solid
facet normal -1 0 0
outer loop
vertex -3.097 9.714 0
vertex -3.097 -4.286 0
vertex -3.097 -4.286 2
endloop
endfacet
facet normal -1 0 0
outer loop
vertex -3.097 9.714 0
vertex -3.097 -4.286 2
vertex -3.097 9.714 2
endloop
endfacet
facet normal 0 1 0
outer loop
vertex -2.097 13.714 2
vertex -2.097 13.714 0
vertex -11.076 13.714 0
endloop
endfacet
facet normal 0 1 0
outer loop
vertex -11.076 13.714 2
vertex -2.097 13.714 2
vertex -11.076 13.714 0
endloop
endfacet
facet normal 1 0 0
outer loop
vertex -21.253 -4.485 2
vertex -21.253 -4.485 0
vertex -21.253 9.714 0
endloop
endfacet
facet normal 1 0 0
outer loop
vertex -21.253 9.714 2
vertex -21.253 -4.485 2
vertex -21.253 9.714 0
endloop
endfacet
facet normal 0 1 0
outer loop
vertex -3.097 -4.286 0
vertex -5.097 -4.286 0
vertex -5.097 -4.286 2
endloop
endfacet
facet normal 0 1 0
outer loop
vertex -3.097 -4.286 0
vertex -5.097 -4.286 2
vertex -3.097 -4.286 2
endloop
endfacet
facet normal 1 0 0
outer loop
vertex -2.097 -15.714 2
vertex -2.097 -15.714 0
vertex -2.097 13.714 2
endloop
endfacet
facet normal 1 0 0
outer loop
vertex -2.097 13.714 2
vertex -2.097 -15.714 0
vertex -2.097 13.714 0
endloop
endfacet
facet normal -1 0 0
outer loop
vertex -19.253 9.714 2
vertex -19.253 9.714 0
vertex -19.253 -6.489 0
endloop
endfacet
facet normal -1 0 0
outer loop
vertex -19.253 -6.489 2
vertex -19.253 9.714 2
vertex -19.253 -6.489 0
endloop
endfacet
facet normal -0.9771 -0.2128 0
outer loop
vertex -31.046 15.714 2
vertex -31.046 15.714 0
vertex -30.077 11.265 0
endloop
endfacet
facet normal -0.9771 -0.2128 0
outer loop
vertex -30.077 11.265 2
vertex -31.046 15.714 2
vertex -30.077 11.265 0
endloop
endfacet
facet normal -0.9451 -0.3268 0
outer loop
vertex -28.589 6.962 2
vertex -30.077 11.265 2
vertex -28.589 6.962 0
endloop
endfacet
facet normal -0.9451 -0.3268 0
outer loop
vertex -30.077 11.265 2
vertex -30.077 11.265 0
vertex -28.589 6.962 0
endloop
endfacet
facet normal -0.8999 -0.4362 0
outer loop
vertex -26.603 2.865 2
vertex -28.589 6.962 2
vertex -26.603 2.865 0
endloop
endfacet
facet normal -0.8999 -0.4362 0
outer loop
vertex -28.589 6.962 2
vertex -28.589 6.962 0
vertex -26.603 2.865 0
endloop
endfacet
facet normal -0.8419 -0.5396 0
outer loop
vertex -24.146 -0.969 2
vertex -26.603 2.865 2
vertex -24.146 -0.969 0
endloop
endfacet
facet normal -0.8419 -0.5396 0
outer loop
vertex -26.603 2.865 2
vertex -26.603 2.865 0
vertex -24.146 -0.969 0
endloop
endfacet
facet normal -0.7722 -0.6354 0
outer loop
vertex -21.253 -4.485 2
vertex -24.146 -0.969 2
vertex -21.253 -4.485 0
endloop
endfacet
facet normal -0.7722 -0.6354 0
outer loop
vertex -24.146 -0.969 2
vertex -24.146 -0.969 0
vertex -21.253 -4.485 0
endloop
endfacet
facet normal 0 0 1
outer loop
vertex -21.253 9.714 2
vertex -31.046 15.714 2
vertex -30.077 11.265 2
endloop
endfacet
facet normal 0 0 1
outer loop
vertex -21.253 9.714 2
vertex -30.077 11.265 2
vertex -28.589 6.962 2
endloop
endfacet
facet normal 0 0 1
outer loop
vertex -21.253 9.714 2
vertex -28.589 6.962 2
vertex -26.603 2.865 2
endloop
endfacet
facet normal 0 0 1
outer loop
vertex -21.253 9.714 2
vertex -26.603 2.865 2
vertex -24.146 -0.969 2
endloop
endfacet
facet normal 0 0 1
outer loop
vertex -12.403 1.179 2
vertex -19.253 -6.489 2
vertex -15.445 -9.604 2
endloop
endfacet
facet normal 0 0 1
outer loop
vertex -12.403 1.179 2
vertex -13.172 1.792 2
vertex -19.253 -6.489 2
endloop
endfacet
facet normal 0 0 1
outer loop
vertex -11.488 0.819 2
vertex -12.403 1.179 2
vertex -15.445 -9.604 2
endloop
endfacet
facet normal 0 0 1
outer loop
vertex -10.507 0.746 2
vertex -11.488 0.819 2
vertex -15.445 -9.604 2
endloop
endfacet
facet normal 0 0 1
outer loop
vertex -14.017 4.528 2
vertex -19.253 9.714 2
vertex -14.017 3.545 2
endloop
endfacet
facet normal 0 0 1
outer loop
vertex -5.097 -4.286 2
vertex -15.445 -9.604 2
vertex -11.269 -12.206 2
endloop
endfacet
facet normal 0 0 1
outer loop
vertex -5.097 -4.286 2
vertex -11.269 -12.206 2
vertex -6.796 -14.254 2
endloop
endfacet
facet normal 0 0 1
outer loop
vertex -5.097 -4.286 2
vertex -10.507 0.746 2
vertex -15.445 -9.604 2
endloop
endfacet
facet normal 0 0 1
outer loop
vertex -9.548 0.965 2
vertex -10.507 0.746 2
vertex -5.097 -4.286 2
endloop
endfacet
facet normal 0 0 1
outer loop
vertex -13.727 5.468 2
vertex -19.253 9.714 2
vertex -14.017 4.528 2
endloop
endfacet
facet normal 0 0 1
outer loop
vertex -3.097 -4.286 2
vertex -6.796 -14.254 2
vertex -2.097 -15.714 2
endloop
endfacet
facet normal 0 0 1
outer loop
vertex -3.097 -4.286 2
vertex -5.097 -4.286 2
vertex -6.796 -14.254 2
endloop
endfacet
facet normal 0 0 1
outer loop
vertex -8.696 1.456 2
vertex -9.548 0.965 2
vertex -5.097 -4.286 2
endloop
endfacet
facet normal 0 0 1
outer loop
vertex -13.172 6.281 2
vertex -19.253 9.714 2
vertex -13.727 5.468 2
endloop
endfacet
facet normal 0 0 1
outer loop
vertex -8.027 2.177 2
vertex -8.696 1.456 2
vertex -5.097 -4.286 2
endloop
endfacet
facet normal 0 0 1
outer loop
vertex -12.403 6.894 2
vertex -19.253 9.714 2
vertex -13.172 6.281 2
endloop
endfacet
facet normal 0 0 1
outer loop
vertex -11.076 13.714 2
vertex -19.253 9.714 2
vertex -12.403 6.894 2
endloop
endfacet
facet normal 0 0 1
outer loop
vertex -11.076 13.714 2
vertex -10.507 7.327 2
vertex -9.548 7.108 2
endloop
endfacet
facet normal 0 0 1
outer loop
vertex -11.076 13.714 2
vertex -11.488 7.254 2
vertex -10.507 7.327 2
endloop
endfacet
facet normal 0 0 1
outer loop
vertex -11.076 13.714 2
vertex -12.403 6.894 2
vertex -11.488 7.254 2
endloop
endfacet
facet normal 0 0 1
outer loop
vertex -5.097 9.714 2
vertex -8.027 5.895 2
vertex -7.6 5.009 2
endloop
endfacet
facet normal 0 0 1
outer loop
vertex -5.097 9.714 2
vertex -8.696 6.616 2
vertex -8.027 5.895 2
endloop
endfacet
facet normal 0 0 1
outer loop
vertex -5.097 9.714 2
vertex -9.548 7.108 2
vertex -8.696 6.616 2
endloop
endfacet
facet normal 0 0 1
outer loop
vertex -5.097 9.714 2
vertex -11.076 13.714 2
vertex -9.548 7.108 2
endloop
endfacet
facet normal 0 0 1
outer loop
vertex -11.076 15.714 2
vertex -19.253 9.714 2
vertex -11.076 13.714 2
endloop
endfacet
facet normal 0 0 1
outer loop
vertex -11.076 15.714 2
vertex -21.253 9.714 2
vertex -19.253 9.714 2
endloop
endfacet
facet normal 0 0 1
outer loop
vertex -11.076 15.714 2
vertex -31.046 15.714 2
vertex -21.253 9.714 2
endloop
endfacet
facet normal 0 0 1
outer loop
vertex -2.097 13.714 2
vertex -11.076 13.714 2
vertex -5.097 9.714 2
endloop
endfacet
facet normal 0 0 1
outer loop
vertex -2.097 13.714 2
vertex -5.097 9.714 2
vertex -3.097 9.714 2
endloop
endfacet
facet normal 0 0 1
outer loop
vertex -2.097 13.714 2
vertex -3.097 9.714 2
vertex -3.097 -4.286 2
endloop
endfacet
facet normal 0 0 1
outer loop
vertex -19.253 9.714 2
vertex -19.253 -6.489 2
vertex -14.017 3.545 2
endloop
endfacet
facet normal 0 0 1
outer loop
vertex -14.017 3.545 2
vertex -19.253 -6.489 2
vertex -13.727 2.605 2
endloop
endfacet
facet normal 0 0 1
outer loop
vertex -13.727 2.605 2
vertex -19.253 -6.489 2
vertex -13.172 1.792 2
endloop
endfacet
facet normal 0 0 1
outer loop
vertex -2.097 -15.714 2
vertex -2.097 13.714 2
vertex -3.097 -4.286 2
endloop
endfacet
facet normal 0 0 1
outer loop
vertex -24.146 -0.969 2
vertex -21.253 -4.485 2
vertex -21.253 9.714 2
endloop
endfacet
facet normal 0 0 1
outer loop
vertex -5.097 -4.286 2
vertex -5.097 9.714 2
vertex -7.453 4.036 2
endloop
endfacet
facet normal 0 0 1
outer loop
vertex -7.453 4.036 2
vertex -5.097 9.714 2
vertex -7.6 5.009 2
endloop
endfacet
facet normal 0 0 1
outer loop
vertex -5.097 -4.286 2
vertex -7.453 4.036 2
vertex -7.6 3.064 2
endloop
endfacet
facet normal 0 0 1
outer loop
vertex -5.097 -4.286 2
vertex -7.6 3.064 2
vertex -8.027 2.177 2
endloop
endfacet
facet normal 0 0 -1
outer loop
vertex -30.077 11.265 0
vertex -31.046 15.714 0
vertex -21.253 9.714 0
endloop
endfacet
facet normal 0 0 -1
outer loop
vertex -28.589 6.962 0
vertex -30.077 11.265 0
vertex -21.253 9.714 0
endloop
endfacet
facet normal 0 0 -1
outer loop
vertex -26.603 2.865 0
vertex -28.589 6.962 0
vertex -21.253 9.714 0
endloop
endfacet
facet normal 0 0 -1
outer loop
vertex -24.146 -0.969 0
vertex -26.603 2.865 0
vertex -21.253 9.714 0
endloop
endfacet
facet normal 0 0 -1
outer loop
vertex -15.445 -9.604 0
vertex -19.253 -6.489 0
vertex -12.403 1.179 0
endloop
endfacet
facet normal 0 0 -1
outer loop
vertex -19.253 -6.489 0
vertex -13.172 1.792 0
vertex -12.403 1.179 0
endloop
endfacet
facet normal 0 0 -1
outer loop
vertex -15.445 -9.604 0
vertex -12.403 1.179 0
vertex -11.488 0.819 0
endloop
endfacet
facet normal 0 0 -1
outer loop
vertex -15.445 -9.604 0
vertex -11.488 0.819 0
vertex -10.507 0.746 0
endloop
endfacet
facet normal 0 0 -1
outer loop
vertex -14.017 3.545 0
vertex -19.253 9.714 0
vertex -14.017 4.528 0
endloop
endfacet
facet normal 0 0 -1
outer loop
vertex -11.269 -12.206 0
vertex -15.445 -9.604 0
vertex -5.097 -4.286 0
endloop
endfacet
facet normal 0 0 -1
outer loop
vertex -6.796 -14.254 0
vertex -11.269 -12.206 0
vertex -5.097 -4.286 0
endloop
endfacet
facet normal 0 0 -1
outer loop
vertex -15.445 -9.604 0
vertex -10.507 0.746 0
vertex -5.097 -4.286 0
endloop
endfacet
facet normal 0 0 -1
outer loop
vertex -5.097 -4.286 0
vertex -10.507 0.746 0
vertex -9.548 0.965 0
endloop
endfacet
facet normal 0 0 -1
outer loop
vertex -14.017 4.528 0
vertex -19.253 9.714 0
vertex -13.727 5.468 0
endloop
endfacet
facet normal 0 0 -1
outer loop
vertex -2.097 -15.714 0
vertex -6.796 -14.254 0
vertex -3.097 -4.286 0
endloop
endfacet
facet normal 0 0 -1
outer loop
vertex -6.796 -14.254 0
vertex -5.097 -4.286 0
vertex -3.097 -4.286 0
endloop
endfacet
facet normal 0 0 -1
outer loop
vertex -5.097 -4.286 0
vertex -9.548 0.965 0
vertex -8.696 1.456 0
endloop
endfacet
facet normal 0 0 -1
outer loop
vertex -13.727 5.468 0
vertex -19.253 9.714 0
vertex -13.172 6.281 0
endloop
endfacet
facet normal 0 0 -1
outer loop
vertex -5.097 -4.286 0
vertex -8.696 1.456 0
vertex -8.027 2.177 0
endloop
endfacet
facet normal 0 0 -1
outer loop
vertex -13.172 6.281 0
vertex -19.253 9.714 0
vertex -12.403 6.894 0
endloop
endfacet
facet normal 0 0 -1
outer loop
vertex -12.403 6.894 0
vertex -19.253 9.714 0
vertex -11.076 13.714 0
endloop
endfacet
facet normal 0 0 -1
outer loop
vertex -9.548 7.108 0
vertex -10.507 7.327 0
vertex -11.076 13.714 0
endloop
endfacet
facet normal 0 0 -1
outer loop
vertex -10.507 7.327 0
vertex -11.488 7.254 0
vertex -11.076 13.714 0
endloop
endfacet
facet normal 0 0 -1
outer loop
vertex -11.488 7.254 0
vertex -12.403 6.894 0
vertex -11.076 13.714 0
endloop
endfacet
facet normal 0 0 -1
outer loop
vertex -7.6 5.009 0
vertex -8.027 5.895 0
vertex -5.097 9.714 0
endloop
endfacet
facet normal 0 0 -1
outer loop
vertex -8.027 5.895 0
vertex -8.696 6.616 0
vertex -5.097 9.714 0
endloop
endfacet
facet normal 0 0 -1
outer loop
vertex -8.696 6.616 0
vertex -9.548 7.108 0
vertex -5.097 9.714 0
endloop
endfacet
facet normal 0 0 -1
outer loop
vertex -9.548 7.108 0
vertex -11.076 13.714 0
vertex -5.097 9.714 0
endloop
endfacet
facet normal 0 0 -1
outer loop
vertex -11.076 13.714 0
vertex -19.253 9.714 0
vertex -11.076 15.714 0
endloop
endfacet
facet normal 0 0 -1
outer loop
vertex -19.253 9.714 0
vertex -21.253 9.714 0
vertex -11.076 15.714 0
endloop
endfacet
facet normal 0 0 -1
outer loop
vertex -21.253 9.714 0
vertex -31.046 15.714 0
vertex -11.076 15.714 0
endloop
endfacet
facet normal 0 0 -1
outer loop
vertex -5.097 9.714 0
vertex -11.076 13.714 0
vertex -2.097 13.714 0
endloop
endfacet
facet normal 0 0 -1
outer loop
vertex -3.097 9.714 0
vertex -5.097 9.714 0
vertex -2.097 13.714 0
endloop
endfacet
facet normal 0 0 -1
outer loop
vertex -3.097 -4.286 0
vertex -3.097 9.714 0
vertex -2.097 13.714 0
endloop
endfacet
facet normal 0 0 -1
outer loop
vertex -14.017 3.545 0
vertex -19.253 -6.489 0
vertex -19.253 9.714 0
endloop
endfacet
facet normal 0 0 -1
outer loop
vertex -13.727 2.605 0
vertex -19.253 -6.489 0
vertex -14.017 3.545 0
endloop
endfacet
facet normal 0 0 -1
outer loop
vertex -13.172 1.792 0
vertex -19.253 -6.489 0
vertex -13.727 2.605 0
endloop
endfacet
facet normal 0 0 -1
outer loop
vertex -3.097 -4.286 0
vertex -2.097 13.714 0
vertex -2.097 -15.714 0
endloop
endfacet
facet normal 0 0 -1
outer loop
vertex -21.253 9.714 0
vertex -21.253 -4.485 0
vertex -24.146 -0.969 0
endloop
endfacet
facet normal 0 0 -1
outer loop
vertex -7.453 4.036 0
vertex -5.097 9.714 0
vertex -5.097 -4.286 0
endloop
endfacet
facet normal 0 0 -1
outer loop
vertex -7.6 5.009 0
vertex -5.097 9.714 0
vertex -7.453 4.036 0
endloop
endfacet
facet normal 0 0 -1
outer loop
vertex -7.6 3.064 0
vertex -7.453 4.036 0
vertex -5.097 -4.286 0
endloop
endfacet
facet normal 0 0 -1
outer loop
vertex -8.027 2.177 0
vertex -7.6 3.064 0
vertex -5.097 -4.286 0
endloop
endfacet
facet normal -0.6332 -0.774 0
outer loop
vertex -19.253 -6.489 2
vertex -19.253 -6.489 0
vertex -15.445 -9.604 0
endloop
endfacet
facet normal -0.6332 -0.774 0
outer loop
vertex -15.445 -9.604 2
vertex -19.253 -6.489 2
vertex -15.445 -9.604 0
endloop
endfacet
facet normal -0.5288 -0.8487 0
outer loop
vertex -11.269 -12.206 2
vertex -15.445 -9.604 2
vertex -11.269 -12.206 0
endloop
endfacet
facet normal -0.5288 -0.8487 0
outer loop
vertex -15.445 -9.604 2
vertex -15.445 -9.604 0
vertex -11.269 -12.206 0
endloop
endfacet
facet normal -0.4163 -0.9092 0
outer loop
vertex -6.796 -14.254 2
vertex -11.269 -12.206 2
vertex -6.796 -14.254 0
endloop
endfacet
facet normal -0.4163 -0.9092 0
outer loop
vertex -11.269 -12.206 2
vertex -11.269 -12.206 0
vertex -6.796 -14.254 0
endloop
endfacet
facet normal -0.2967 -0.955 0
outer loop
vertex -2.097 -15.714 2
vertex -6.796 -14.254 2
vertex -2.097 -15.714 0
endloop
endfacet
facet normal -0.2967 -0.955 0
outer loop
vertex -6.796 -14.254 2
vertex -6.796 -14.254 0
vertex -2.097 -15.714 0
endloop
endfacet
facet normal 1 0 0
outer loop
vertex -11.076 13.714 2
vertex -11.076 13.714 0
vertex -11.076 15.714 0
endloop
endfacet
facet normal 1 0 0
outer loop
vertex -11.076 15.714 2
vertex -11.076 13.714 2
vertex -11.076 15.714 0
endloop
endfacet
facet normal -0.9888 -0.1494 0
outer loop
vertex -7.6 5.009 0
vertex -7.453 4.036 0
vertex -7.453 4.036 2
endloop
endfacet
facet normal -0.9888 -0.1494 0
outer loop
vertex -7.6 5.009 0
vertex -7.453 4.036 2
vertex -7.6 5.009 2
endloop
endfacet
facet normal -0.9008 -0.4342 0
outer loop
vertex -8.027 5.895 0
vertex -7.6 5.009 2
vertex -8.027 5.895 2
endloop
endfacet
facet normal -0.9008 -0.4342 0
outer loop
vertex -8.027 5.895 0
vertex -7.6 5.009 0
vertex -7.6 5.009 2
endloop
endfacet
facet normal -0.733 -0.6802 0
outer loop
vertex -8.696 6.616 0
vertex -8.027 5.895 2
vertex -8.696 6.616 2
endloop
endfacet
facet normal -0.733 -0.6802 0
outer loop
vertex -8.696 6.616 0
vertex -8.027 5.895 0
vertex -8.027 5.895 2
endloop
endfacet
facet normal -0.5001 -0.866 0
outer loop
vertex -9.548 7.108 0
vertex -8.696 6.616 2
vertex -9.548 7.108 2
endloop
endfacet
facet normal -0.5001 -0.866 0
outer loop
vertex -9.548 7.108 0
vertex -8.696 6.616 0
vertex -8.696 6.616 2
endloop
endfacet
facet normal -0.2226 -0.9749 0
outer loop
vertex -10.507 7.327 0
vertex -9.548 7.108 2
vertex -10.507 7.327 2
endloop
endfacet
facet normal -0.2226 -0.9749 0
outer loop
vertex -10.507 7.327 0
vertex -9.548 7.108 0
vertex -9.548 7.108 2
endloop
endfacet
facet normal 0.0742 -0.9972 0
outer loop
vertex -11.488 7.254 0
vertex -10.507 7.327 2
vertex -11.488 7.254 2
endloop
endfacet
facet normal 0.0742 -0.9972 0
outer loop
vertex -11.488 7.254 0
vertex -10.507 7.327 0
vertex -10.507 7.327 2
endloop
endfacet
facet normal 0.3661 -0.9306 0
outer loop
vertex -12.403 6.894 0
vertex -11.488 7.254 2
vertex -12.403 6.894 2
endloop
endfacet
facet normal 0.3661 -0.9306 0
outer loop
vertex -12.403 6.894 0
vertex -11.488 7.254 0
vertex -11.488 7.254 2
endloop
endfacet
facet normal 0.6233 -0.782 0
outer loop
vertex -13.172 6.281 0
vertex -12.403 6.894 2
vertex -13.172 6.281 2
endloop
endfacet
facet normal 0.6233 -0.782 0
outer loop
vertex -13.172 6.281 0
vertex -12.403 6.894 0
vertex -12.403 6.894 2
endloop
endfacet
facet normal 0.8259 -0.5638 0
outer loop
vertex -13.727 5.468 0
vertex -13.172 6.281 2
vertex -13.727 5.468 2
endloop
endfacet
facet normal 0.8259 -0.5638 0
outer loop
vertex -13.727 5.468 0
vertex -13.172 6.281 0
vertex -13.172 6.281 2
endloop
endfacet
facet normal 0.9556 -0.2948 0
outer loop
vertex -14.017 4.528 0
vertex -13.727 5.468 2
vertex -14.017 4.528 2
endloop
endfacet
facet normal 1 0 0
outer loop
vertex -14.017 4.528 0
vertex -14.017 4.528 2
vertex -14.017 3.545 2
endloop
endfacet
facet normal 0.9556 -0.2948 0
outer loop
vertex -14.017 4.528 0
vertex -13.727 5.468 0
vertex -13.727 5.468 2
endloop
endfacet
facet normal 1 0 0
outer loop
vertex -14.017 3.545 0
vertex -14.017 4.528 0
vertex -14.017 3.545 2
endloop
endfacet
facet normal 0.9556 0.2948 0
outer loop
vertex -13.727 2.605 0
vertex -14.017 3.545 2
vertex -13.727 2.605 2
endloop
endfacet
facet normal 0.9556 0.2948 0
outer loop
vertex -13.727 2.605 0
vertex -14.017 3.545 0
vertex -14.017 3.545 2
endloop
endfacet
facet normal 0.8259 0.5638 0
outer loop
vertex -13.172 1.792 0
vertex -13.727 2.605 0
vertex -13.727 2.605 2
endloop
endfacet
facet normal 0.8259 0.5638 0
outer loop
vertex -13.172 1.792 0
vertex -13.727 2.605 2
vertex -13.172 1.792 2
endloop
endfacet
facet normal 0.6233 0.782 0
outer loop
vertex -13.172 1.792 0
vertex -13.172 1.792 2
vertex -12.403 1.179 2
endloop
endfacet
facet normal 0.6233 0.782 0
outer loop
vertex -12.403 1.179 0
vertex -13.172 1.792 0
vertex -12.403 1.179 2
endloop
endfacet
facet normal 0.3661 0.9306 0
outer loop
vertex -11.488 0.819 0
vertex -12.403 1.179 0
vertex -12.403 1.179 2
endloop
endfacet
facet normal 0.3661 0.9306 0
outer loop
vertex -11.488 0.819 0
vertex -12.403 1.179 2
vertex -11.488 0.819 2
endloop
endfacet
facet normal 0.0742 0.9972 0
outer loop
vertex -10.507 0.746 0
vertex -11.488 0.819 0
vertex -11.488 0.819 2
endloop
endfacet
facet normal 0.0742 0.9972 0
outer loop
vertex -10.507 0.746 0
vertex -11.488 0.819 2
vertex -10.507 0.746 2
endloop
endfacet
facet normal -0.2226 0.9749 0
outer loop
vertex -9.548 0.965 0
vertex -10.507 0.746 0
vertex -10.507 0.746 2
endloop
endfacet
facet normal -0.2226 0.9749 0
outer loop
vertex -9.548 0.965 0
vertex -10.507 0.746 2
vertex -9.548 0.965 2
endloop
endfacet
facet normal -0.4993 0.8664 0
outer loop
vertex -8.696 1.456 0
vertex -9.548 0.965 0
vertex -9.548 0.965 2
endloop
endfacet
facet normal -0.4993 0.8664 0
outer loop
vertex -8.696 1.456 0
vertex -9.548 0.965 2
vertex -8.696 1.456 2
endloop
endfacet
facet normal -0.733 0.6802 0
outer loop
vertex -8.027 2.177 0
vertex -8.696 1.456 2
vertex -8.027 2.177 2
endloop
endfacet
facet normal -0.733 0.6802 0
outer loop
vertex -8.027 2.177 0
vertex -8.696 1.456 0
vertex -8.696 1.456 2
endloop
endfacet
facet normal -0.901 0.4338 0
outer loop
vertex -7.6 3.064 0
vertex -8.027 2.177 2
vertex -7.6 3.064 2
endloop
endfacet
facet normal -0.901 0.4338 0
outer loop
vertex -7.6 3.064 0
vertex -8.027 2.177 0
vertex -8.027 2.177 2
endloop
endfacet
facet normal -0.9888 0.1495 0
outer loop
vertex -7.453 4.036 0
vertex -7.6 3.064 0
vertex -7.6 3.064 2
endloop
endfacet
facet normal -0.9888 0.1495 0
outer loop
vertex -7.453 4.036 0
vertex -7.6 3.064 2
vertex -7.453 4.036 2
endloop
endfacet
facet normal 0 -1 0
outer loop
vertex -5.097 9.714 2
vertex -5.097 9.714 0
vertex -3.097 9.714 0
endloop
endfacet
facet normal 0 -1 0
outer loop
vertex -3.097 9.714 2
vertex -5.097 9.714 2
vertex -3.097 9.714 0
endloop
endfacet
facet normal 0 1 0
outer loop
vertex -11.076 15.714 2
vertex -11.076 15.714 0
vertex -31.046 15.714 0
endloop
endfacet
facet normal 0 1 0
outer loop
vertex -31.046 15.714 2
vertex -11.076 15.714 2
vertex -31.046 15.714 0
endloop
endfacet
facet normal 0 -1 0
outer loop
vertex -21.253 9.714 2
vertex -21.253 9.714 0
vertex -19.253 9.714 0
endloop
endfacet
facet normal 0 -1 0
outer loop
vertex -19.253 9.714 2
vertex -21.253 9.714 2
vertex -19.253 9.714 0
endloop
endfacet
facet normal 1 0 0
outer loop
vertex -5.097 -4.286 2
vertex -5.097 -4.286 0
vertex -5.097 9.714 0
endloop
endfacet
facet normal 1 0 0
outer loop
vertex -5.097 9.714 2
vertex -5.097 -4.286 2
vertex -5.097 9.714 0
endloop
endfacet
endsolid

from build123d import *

# Parameters (mm, degrees)
SKETCH1_R           = 3.3
SKETCH1_W           = 2
SKETCH1_H           = 14
BOSS_EXTRUDE1_DEPTH = 2


with BuildPart() as part:
    # Sketch1 → Boss-Extrude1 (new body)
    with BuildSketch(Plane.XY):
        with BuildLine():
            Line((-19.253359056, 9.714066104), (-19.253359056, -6.489091482))
            ThreePointArc((-19.253359056, -6.489091482), (-11.269151238, -12.206183048), (-2.097048594, -15.714066104))
            Line((-2.097048594, -15.714066104), (-2.097048594, 13.714066104))
            Line((-2.097048594, 13.714066104), (-11.075689526, 13.714066104))
            Line((-11.075689526, 13.714066104), (-11.075689526, 15.714066104))
            Line((-11.075689526, 15.714066104), (-31.04567167, 15.714066104))
            ThreePointArc((-31.04567167, 15.714066104), (-27.656648188, 4.883682523), (-21.253359056, -4.485446411))
            Line((-21.253359056, -4.485446411), (-21.253359056, 9.714066104))
            Line((-21.253359056, 9.714066104), (-19.253359056, 9.714066104))
        make_face()
        with Locations((-10.753359056, 4.036396574)):
            Circle(SKETCH1_R, mode=Mode.SUBTRACT)
        with Locations((-4.097048594, 2.714066104)):
            Rectangle(SKETCH1_W, SKETCH1_H, mode=Mode.SUBTRACT)
    extrude(amount=BOSS_EXTRUDE1_DEPTH)


solid = part.part
